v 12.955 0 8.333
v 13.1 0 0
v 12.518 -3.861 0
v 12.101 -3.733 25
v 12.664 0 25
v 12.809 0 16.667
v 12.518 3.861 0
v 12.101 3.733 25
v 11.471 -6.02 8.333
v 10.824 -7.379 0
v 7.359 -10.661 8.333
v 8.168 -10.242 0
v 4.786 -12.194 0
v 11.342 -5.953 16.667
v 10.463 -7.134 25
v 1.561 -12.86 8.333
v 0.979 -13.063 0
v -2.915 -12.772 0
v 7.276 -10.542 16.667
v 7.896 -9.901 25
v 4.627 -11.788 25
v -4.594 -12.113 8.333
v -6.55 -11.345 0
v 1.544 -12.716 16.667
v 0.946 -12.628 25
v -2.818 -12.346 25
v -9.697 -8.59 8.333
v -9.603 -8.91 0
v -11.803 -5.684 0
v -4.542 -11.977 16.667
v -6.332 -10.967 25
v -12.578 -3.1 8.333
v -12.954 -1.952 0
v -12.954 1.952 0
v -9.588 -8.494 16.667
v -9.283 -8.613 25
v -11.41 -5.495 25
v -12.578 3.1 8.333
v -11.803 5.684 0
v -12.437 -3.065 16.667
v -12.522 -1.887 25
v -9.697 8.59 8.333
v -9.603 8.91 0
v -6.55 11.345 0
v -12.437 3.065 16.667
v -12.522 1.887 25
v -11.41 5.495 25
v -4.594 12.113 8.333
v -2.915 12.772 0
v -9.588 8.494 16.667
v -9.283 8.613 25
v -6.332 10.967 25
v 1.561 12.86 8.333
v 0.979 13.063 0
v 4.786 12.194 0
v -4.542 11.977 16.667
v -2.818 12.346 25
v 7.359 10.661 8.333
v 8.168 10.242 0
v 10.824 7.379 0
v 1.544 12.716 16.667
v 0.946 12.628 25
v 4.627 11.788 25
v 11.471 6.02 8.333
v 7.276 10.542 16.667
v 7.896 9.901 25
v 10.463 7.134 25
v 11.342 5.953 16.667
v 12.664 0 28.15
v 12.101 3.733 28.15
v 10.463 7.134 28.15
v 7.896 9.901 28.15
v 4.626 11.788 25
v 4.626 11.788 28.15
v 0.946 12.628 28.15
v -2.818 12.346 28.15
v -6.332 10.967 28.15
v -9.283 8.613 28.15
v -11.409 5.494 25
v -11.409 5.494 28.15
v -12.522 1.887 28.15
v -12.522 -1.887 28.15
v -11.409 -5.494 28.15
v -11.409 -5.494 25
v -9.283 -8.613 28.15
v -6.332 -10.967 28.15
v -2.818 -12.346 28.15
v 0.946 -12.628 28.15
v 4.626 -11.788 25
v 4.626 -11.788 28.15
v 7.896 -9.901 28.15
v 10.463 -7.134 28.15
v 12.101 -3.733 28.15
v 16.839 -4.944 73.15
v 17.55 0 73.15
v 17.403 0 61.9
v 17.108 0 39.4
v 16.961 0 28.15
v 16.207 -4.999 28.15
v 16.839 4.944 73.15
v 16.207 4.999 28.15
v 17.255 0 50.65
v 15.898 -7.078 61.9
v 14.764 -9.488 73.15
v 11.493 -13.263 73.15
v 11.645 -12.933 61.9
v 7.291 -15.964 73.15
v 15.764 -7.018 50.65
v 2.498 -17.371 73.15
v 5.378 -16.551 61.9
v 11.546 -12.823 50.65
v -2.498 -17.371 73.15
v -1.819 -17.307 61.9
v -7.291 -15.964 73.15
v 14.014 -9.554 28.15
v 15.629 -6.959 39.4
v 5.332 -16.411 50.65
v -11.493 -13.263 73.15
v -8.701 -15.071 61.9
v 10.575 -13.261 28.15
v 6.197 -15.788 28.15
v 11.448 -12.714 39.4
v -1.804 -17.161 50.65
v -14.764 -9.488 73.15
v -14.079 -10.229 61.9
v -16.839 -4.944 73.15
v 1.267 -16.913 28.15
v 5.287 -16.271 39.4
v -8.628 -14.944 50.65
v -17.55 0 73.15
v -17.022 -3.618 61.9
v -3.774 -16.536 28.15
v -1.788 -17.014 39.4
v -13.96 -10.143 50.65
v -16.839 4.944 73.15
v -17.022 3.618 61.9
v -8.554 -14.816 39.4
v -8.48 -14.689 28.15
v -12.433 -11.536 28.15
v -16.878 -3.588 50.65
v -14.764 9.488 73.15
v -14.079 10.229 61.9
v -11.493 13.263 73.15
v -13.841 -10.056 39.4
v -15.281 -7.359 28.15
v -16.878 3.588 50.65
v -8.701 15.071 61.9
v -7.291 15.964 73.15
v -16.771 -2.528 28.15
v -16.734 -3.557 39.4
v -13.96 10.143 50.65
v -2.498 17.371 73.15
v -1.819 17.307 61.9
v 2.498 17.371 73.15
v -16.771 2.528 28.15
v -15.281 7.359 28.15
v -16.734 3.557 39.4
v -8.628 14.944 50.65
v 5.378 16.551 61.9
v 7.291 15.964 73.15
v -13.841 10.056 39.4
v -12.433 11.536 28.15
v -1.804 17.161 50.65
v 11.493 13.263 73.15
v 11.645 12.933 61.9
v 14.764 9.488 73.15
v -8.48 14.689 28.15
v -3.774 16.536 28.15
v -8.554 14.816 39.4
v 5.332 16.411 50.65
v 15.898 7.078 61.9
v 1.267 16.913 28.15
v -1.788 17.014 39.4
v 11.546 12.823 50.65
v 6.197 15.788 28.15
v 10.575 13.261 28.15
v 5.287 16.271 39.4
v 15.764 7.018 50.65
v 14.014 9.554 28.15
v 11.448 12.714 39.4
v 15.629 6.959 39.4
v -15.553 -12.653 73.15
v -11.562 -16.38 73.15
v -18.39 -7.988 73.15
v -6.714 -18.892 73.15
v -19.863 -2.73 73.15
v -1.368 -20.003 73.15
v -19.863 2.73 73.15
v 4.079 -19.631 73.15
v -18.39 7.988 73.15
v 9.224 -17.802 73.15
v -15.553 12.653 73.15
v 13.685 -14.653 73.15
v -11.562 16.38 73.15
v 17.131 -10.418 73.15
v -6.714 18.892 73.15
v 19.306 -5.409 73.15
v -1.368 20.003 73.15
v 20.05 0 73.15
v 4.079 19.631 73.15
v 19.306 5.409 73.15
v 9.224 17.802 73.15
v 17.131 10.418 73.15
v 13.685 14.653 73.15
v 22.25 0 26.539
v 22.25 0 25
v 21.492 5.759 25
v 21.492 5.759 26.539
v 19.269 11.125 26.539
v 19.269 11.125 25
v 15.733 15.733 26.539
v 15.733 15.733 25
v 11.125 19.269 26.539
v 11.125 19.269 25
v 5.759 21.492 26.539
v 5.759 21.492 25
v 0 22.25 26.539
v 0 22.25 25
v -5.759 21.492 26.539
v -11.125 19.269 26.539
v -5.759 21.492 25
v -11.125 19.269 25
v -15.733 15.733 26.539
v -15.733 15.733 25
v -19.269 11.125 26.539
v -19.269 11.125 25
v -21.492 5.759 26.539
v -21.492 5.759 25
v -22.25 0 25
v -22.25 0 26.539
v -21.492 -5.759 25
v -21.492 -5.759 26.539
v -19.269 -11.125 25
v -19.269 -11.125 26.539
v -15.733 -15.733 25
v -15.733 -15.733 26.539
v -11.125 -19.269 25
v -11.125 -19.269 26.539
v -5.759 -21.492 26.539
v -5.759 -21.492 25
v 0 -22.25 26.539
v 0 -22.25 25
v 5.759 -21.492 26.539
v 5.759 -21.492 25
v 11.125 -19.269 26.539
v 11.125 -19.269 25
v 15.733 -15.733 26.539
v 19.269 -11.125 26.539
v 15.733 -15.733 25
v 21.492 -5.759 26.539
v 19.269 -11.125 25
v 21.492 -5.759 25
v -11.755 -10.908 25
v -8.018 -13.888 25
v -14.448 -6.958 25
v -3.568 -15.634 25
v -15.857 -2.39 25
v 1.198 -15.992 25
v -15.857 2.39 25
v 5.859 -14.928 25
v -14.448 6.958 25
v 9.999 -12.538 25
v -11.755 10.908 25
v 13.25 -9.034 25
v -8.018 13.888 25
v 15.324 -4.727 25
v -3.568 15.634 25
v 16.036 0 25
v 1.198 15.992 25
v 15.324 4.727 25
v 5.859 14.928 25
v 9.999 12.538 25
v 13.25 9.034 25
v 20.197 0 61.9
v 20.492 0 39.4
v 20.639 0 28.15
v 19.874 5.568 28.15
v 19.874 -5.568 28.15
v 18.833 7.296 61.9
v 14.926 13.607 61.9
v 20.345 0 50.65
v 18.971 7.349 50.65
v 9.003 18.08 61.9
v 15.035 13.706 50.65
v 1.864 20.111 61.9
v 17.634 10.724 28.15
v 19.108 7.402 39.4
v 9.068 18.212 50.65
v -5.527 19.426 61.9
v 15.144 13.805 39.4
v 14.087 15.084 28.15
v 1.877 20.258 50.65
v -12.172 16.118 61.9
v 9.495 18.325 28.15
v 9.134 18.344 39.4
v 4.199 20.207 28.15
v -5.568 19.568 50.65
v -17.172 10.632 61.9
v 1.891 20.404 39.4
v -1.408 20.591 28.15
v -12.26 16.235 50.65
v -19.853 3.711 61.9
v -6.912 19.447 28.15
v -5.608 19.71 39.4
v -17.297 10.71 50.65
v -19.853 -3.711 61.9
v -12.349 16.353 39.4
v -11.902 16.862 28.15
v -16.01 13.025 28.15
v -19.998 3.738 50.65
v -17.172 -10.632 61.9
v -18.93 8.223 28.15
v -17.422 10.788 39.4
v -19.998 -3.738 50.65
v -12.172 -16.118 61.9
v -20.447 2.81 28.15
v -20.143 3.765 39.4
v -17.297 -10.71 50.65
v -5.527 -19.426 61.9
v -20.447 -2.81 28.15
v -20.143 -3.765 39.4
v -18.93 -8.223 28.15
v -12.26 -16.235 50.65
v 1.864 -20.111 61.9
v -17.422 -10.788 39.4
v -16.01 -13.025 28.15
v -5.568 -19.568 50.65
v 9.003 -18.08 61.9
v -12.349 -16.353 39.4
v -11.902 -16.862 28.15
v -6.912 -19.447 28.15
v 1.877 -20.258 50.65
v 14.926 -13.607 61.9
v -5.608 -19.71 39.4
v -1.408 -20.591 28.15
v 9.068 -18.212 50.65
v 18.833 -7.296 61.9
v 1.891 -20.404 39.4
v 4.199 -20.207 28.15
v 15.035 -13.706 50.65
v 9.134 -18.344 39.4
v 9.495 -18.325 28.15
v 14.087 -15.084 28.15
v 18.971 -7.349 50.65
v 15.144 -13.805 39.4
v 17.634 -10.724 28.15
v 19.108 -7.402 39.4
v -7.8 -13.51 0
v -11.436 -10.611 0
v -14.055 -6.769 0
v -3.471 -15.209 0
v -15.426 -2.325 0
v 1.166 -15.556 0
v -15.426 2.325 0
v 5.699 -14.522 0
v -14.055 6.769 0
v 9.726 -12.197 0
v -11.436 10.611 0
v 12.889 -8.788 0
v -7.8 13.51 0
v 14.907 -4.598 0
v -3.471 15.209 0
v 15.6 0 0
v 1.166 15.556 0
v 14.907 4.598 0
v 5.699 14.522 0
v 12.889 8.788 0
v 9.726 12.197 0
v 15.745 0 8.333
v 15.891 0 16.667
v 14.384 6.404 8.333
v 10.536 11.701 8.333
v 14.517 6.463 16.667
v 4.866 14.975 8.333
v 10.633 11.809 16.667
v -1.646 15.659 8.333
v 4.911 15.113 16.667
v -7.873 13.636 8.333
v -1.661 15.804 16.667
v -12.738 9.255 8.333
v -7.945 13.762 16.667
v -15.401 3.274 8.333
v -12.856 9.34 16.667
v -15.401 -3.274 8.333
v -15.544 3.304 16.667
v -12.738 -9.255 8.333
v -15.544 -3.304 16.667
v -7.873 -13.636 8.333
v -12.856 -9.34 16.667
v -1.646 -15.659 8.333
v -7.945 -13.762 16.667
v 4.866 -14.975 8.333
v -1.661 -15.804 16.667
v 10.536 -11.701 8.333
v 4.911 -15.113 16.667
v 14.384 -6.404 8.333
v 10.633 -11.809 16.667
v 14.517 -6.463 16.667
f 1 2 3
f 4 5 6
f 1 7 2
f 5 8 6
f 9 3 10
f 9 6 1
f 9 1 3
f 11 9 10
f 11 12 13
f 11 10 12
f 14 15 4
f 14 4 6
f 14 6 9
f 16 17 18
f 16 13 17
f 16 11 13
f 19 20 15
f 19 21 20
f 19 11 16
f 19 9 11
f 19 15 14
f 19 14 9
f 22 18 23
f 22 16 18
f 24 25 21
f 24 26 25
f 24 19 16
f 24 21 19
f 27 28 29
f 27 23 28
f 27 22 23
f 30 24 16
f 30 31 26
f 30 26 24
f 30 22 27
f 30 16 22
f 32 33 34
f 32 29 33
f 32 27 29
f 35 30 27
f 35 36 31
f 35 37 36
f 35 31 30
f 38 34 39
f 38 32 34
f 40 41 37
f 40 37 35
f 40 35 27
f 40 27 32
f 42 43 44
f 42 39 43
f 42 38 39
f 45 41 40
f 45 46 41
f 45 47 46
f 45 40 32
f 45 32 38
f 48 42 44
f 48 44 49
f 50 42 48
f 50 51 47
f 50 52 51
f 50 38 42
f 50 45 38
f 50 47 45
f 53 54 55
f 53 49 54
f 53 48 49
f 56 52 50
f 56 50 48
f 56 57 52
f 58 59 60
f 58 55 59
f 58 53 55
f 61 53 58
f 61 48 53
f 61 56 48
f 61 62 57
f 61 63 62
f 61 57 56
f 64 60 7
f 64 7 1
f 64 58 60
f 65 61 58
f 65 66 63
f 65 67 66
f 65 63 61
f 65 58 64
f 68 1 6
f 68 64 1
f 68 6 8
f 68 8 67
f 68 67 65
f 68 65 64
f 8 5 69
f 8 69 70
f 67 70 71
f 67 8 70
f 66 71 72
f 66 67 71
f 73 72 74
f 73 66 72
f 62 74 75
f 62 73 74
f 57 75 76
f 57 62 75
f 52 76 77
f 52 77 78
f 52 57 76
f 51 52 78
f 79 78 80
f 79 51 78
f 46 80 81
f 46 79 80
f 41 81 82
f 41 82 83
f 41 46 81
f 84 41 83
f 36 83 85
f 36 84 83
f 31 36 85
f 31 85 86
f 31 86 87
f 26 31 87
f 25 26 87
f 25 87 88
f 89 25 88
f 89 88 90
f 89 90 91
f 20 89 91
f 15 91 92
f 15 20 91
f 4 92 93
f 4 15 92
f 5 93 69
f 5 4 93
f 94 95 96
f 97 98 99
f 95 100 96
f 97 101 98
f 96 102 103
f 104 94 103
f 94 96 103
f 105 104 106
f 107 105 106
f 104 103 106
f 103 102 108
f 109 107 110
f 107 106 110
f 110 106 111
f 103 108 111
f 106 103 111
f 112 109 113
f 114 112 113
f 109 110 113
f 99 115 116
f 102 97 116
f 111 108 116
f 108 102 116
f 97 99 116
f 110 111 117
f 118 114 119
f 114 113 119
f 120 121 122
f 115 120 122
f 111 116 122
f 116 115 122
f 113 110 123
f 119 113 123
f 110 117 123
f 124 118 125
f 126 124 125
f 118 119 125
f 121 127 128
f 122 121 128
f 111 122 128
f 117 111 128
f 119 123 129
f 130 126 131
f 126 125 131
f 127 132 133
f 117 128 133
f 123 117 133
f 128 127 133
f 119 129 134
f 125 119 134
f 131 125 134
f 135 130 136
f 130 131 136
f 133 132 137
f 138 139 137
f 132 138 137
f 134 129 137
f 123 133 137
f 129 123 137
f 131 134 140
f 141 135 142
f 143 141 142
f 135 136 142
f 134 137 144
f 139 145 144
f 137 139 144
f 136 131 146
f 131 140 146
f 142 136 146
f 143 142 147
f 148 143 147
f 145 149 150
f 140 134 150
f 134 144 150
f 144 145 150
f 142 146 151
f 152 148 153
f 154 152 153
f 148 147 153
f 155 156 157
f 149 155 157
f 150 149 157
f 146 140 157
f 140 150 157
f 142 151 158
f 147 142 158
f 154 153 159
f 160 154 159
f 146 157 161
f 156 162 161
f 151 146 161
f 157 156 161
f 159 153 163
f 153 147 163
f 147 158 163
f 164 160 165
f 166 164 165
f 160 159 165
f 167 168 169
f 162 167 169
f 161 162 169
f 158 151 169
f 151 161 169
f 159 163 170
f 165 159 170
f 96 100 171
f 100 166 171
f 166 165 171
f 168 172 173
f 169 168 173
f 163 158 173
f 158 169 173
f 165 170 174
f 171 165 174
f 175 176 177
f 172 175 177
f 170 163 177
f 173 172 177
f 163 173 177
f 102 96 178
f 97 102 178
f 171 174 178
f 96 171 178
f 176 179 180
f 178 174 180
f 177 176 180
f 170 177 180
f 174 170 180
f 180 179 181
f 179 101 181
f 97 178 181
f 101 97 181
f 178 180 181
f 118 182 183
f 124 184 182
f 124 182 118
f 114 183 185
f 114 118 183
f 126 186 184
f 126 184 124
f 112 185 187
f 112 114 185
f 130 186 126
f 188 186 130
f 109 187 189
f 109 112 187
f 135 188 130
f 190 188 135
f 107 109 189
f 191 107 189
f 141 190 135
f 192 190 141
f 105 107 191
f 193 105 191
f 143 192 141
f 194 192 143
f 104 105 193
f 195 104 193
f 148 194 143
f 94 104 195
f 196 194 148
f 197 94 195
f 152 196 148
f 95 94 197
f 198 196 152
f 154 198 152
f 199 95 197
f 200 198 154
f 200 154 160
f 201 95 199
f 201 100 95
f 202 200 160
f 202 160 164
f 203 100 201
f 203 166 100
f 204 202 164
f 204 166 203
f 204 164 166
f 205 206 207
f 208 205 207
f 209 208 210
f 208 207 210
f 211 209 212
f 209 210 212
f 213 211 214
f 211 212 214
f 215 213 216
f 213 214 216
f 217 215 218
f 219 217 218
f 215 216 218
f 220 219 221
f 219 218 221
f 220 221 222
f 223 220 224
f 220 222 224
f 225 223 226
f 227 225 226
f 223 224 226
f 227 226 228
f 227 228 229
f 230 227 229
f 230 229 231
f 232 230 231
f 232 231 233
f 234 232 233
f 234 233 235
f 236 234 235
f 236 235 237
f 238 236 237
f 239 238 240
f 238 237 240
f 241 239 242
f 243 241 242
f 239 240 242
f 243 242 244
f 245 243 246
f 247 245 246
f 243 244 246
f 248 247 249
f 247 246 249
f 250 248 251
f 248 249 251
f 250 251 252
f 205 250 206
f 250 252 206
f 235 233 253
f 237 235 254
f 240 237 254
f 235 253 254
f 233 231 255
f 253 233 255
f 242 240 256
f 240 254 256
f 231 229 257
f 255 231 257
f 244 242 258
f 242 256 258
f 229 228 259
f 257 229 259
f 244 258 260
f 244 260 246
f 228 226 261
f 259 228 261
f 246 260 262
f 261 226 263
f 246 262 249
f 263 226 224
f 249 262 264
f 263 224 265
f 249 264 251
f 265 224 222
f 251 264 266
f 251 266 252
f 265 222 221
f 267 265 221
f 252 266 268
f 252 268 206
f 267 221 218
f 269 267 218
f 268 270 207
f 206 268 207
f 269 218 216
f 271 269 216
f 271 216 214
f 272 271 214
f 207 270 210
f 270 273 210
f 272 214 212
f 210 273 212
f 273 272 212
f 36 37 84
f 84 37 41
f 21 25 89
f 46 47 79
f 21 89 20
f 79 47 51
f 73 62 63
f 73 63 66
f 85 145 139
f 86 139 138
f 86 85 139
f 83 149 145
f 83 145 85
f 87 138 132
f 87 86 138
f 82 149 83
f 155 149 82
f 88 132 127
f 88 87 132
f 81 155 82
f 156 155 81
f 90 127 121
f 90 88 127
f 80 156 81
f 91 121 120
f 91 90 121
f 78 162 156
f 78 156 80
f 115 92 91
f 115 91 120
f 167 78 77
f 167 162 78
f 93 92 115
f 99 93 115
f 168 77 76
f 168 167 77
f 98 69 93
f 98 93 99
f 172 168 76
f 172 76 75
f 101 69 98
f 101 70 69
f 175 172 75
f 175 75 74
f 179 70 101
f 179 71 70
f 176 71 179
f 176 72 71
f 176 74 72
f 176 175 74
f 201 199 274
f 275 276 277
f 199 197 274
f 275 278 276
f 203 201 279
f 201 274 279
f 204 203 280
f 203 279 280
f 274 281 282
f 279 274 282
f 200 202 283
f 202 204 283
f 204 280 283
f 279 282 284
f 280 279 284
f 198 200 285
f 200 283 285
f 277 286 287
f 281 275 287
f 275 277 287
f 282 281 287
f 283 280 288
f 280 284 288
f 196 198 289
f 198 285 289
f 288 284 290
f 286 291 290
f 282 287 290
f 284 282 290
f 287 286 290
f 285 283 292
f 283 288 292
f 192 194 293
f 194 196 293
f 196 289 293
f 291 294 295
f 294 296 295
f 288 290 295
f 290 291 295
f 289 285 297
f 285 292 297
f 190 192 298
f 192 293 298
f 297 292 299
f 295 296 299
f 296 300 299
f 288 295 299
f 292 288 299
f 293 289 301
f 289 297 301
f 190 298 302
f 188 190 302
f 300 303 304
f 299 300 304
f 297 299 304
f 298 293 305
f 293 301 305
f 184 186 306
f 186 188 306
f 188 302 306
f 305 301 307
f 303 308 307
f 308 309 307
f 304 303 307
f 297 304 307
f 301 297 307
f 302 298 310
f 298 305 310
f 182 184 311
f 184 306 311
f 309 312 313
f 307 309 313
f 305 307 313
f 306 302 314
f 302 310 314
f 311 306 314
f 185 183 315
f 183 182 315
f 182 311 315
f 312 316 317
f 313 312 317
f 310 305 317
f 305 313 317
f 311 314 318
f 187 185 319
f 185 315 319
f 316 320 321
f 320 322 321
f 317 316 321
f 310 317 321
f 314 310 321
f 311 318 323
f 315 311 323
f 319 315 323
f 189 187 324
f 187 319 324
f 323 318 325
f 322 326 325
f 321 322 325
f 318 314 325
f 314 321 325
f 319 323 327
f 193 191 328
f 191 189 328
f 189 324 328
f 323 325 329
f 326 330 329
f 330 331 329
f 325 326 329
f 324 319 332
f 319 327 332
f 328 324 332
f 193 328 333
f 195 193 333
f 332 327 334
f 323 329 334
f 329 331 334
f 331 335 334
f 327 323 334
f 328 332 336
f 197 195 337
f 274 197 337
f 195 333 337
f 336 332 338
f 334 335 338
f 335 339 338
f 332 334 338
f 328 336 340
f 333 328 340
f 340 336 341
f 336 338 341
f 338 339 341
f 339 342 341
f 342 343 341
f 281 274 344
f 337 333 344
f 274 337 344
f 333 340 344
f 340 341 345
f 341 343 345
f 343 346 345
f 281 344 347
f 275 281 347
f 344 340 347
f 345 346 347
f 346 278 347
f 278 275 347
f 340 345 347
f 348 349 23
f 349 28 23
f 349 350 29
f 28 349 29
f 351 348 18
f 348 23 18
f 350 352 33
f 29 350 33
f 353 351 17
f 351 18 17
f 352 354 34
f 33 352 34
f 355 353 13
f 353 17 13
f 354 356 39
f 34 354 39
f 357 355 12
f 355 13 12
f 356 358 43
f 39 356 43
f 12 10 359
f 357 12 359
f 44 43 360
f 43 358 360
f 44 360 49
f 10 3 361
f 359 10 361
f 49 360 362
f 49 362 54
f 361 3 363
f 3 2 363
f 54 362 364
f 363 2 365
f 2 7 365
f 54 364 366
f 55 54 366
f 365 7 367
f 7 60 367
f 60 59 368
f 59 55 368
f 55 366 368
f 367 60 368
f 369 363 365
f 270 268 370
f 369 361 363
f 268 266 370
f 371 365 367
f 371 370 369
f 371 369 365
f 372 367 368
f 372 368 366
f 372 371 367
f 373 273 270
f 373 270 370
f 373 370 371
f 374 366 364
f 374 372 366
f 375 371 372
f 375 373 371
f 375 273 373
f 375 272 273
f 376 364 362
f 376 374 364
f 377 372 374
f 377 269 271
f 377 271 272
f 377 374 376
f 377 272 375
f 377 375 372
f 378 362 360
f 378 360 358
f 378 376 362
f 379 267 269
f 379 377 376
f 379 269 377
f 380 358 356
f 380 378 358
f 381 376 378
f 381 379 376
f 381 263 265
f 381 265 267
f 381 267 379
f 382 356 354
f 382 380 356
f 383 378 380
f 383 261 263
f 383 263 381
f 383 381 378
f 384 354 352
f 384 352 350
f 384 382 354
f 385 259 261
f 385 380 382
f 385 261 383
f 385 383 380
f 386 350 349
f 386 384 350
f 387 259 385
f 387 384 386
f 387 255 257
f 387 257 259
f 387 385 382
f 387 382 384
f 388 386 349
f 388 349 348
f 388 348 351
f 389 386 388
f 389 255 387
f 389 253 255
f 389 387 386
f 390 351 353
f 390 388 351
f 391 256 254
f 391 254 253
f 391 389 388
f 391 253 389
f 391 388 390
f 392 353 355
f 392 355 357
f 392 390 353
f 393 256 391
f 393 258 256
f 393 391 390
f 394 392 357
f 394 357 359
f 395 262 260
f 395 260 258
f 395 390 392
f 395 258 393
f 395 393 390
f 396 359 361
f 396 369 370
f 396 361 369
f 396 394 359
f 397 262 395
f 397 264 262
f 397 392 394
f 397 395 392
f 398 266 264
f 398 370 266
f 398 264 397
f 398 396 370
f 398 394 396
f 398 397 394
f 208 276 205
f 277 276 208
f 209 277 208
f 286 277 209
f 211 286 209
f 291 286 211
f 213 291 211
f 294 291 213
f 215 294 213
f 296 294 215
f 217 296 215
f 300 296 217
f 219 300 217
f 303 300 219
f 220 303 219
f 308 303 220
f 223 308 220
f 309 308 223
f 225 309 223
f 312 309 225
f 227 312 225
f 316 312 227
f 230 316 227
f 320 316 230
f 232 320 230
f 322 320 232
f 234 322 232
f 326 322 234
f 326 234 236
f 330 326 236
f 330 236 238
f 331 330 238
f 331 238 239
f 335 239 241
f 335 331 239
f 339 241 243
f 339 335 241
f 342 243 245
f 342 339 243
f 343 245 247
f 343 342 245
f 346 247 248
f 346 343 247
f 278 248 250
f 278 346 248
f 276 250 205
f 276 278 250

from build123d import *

# Parameters (mm, degrees)
F0_R     = 15.6
F0_R_2   = 13.1
F1_DEPTH = 25
F1_TAPER = -1
F2_R     = 22.25
F2_R_2   = 12.6635
F3_DEPTH = 3.15
F5_R     = 20.05
F5_R_2   = 17.55
F6_DEPTH = 45
F6_TAPER = -0.75
F7_SIZE  = 1.6109


with BuildPart() as f1:
    # F0 (on Top) → F1 (new body)
    with BuildSketch(Plane.XY):
        Circle(F0_R)
        Circle(F0_R_2, mode=Mode.SUBTRACT)
    extrude(amount=F1_DEPTH, taper=F1_TAPER)

    # F2 (on face) → F3 (join)
    with BuildSketch(Plane.XY.offset(25)):
        Circle(F2_R)
        Circle(F2_R_2, mode=Mode.SUBTRACT)
    extrude(amount=F3_DEPTH)

    # F5 (on offset) → F6 (join, through all)
    with BuildSketch(Plane.XY.offset(73.15)):
        Circle(F5_R)
        Circle(F5_R_2, mode=Mode.SUBTRACT)
    extrude(amount=-F6_DEPTH, taper=F6_TAPER)

    # F7
    f7_edges = [f1.edges().sort_by_distance(p)[0] for p in [
        (-22.25, 0, 28.15),
    ]]
    chamfer(f7_edges, length=F7_SIZE)


solid = f1.part
